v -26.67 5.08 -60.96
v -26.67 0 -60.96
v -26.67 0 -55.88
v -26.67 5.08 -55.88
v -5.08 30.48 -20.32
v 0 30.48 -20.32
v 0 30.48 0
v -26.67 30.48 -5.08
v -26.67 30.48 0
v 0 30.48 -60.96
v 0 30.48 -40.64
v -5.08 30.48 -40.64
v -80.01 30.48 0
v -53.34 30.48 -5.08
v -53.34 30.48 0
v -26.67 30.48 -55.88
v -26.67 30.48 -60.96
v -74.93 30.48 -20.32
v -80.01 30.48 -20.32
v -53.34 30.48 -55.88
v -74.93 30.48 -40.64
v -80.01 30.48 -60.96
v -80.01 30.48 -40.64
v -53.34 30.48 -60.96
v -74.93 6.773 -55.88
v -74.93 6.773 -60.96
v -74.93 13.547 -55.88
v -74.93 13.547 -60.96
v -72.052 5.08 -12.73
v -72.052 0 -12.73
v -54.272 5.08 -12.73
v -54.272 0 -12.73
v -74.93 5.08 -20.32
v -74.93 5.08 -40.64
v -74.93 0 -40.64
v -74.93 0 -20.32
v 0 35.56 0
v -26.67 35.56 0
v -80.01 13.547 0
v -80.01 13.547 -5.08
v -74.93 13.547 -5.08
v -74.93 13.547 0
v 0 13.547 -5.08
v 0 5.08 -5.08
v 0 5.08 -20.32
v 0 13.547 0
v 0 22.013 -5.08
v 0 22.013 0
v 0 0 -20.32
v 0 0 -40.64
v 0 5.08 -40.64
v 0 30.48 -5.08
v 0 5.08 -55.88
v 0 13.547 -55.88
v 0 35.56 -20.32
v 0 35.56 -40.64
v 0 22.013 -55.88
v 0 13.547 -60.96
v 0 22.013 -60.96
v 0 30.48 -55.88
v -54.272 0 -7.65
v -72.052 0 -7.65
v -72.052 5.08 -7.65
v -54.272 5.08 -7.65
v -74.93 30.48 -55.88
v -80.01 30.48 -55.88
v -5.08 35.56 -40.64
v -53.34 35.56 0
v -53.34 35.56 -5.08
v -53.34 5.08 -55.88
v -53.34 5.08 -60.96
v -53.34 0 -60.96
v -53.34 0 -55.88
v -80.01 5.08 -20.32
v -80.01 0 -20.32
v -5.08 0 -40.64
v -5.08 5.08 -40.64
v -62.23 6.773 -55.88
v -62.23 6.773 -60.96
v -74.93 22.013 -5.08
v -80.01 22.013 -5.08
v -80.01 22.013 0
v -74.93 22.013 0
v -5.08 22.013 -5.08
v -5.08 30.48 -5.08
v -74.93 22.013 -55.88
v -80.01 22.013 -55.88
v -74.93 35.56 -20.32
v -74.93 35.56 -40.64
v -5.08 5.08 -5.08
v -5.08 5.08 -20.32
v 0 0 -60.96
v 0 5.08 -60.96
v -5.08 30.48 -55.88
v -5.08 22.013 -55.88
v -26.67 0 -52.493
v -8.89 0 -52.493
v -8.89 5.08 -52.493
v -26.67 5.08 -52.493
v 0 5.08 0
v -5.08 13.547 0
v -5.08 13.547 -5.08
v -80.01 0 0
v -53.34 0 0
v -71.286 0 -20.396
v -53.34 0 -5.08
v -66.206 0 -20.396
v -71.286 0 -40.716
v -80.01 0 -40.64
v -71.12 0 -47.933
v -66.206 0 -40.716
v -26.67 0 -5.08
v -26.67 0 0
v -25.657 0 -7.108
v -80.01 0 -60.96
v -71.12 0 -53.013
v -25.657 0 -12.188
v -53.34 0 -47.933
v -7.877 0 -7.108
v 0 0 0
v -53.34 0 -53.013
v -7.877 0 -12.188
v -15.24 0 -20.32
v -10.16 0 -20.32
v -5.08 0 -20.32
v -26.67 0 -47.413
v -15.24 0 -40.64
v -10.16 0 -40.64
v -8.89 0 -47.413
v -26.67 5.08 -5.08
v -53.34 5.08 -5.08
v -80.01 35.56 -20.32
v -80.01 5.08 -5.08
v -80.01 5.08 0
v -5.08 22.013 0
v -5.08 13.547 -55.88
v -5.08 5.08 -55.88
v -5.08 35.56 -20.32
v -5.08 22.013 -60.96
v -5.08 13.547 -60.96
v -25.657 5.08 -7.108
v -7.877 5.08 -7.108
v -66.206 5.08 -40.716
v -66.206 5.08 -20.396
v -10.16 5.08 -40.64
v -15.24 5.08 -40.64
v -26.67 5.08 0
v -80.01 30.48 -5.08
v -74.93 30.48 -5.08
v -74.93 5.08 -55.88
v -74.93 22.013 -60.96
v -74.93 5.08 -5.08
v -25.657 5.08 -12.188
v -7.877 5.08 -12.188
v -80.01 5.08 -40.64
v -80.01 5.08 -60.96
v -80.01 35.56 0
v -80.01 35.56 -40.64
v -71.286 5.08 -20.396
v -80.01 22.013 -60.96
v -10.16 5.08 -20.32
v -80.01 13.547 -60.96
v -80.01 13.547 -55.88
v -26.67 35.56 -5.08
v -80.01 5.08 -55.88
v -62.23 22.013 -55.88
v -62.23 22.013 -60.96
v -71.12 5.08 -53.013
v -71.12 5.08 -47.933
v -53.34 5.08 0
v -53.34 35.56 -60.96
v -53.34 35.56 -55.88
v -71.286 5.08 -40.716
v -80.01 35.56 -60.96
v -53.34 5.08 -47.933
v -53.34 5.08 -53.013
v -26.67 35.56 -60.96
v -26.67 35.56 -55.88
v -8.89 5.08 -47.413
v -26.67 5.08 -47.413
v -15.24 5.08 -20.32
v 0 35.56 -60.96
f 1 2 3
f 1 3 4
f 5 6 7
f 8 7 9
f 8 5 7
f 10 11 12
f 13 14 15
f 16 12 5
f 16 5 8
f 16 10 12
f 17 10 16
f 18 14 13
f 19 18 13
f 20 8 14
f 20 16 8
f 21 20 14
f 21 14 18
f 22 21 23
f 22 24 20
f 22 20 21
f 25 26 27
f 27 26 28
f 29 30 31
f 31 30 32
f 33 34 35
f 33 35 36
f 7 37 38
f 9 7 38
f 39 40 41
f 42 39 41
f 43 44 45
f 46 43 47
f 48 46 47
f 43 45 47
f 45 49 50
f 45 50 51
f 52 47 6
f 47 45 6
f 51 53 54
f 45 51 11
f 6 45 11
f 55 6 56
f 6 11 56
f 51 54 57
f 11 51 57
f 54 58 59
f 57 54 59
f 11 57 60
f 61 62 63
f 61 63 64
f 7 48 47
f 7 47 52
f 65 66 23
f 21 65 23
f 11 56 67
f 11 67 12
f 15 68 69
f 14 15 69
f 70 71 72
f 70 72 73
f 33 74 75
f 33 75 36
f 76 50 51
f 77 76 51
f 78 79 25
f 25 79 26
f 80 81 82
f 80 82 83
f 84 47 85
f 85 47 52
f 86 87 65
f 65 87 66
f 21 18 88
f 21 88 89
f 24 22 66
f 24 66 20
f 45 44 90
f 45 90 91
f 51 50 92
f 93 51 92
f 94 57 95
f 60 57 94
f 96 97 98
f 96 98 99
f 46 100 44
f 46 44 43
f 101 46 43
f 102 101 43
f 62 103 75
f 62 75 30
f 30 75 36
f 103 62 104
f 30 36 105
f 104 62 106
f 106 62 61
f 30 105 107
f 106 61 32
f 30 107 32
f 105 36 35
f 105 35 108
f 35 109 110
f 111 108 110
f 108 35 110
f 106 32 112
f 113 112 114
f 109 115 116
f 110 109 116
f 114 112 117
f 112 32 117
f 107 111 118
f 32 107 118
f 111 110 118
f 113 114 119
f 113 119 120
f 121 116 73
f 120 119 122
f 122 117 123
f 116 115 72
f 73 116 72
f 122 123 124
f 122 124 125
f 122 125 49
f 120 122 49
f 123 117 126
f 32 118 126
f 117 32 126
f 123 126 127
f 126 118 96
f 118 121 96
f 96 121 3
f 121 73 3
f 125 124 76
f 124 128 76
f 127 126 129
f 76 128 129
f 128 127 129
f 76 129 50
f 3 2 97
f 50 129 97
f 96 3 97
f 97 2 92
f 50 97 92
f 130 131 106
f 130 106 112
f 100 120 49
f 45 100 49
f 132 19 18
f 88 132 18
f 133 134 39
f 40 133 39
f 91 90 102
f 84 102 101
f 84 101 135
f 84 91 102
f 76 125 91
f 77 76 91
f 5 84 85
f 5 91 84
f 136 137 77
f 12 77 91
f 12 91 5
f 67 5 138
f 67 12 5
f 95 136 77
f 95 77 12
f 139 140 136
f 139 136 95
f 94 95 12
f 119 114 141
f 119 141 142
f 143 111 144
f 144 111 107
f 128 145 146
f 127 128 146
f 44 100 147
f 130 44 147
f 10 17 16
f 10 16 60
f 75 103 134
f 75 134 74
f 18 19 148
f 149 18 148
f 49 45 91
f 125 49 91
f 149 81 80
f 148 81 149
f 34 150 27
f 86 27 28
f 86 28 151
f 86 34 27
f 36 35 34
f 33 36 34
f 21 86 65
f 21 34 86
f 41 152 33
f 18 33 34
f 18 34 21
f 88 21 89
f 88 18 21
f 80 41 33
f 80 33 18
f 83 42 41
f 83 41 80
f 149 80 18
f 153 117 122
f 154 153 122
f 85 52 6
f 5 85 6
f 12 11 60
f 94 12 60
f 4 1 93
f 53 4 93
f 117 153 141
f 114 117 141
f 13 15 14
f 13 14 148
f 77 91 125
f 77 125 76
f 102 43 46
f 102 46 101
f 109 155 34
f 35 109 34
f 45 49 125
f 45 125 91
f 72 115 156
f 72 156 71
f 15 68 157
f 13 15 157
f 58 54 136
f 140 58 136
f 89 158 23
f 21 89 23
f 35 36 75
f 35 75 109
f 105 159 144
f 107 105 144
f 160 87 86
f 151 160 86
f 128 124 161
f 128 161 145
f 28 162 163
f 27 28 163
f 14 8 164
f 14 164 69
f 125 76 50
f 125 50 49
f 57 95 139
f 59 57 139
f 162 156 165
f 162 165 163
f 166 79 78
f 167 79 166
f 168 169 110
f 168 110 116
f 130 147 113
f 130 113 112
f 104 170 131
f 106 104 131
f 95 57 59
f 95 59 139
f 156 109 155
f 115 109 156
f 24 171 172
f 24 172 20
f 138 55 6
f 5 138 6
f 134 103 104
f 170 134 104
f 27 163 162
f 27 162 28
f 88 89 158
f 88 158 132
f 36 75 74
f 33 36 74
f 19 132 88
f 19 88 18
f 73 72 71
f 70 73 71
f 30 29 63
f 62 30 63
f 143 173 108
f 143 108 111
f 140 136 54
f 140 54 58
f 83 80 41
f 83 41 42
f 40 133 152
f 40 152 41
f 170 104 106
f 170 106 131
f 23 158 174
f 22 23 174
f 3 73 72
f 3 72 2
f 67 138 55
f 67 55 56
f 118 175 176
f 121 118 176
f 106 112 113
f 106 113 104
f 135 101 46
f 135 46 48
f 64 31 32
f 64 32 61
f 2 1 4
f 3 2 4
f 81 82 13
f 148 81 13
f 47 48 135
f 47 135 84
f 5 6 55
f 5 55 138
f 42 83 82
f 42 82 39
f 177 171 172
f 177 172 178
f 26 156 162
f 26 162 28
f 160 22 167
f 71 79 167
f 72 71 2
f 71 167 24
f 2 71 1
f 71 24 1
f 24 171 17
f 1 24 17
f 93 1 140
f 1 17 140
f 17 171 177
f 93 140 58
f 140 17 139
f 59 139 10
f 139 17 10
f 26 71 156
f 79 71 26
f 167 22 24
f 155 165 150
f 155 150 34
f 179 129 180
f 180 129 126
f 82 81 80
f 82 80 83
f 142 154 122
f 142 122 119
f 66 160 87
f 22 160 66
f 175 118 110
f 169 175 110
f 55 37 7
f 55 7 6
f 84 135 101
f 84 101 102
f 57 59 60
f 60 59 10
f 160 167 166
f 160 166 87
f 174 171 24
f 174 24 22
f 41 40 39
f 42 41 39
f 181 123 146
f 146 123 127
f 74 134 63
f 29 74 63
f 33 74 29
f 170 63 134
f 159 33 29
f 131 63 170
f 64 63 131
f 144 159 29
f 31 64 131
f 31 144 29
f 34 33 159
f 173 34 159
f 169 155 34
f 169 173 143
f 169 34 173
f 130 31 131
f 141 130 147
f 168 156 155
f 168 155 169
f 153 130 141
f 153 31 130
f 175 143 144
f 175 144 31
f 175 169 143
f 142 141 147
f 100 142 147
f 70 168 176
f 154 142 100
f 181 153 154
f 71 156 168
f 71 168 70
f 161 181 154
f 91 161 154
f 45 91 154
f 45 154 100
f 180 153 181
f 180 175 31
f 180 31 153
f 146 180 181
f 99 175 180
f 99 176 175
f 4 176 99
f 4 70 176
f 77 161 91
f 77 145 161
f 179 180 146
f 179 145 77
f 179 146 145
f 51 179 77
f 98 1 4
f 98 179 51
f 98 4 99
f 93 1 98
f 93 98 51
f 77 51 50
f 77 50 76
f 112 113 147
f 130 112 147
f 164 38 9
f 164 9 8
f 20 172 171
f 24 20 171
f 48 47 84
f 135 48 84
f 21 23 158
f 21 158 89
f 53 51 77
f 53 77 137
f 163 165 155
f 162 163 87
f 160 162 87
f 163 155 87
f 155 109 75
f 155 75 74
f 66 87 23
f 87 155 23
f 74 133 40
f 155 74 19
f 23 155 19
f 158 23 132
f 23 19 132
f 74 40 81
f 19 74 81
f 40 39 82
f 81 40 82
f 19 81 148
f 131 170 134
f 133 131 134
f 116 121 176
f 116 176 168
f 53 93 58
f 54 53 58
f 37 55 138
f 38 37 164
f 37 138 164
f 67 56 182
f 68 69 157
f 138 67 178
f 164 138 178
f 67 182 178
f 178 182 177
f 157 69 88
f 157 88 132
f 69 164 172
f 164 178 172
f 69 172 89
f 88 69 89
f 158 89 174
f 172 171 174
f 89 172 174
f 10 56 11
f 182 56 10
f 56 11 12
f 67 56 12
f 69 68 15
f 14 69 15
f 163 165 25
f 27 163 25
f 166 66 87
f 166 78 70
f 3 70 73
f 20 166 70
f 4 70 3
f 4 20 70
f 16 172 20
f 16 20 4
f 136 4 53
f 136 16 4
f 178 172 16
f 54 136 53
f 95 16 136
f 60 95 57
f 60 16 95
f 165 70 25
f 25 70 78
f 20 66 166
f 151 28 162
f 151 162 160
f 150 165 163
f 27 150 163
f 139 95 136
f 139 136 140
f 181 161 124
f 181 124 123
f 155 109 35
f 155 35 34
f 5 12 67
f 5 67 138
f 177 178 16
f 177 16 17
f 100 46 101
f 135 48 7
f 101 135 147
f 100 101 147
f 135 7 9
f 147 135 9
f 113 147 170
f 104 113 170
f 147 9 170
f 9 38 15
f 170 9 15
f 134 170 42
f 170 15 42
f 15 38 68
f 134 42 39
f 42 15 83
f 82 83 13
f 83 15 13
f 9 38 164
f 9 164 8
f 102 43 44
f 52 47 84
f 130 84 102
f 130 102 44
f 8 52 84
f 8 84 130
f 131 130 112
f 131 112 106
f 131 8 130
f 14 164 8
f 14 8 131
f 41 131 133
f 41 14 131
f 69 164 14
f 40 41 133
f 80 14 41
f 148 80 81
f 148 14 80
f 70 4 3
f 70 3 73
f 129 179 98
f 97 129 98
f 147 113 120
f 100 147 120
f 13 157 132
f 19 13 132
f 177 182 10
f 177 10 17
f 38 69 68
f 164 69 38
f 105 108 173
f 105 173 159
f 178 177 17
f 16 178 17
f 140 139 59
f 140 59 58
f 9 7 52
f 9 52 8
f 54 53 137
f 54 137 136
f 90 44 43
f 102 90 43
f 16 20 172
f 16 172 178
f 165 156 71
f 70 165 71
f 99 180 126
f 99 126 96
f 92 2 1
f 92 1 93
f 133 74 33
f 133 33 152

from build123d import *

# Parameters (mm, degrees)
SKETCH1_W             = 80.01
SKETCH1_H             = 60.96
BOSS_EXTRUDE2_DEPTH   = 5.08
SKETCH2_W             = 20.32
SKETCH2_H             = 5.08
CUT_EXTRUDE1_DEPTH    = 5.08
SKETCH3_W             = 20.32
SKETCH3_H             = 5.08
CUT_EXTRUDE2_DEPTH    = 5.08
SKETCH4_W             = 26.67
SKETCH4_H             = 5.08
CUT_EXTRUDE3_DEPTH    = 5.08
SKETCH5_W             = 26.67
SKETCH5_H             = 5.08
CUT_EXTRUDE4_DEPTH    = 5.08
SKETCH6_W             = 80.01
SKETCH6_H             = 25.4
BOSS_EXTRUDE3_DEPTH   = 5.08
SKETCH7_W             = 26.67
SKETCH7_H             = 5.08
BOSS_EXTRUDE4_DEPTH   = 5.08
BODY_MOVE_COPY1_ANGLE = 90
CIRPATTERN1_COUNT     = 2
SKETCH8_W             = 5.08
SKETCH8_H             = 8.466666666
CUT_EXTRUDE5_DEPTH    = 5.08
SKETCH10_W            = 5.08
SKETCH10_H            = 8.466666666
CUT_EXTRUDE7_DEPTH    = 5.08
SKETCH17_W            = 12.7
SKETCH17_H            = 15.24
CUT_EXTRUDE8_DEPTH    = 5.08
SKETCH18_W            = 26.67
SKETCH18_H            = 5.08
BOSS_EXTRUDE11_DEPTH  = 5.08
CIRPATTERN4_COUNT     = 2
SKETCH19_W            = 25.4
SKETCH19_H            = 50.8
BOSS_EXTRUDE12_DEPTH  = 5.08
SKETCH20_W            = 8.466666666
SKETCH20_H            = 5.08
BOSS_EXTRUDE13_DEPTH  = 5.08
SKETCH21_W            = 8.466666666
SKETCH21_H            = 5.08
BOSS_EXTRUDE14_DEPTH  = 5.08
SKETCH22_W            = 20.32
SKETCH22_H            = 5.08
BOSS_EXTRUDE15_DEPTH  = 5.08
SKETCH23_W            = 20.32
SKETCH23_H            = 5.08
BOSS_EXTRUDE16_DEPTH  = 5.08
BODY_MOVE_COPY4_ANGLE = 90
CIRPATTERN5_ANGLE     = 180
SKETCH24_W            = 17.78
SKETCH24_H            = 5.08
CUT_EXTRUDE9_DEPTH    = 5.08
CIRPATTERN6_COUNT     = 2
SKETCH25_W            = 17.78
SKETCH25_H            = 5.08
CUT_EXTRUDE10_DEPTH   = 5.08
CIRPATTERN7_COUNT     = 2
SKETCH28_W            = 5.08
SKETCH28_H            = 20.32
CUT_EXTRUDE11_DEPTH   = 5.08
CIRPATTERN8_COUNT     = 2


with BuildPart() as part:
    # Sketch1 → Boss-Extrude2 (new body)
    with BuildSketch(Plane(origin=(0, 0, 0), x_dir=(1, 0, 0), z_dir=(0, 1, 0))):
        with Locations((-40.005, 30.48)):
            Rectangle(SKETCH1_W, SKETCH1_H)
    extrude(amount=BOSS_EXTRUDE2_DEPTH)

    # Sketch2 → Cut-Extrude1 (cut)
    with BuildSketch(Plane(origin=(0, 0, 0), x_dir=(0, 0, -1), z_dir=(1, 0, 0))):
        with Locations((30.48, 2.54)):
            Rectangle(SKETCH2_W, SKETCH2_H)
    extrude(amount=-CUT_EXTRUDE1_DEPTH, mode=Mode.SUBTRACT)

    # Sketch3 → Cut-Extrude2 (cut)
    with BuildSketch(Plane.ZY.offset(80.01)):
        with Locations((-30.48, 2.54)):
            Rectangle(SKETCH3_W, SKETCH3_H)
    extrude(amount=-CUT_EXTRUDE2_DEPTH, mode=Mode.SUBTRACT)

    # Sketch4 → Cut-Extrude3 (cut)
    with BuildSketch(Plane.XY):
        with Locations((-40.005, 2.54)):
            Rectangle(SKETCH4_W, SKETCH4_H)
    extrude(amount=-CUT_EXTRUDE3_DEPTH, mode=Mode.SUBTRACT)

    # Sketch5 → Cut-Extrude4 (cut)
    with BuildSketch(Plane(origin=(0, 0, -60.96), x_dir=(-1, 0, 0), z_dir=(0, 0, -1))):
        with Locations((40.005, 2.54)):
            Rectangle(SKETCH5_W, SKETCH5_H)
    extrude(amount=-CUT_EXTRUDE4_DEPTH, mode=Mode.SUBTRACT)


with BuildPart() as body_2:
    # Sketch6 → Boss-Extrude3 (new body)
    with BuildSketch(Plane(origin=(0, 5.08, 0), x_dir=(1, 0, 0), z_dir=(0, 1, 0))):
        with Locations((-21.199489538, 114.542707296)):
            Rectangle(SKETCH6_W, SKETCH6_H)
    extrude(amount=BOSS_EXTRUDE3_DEPTH)

    # Sketch7 → Boss-Extrude4 (add)
    with BuildSketch(Plane.XY.offset(-101.842707296)):
        with Locations((-21.199489538, 7.62)):
            Rectangle(SKETCH7_W, SKETCH7_H)
    extrude(amount=BOSS_EXTRUDE4_DEPTH)


with BuildPart() as body_2_1:
    # Body-Move/Copy1: read off the stored shape, not the designer's step
    # Body-Move/Copy1: moved
    add(body_2.part.moved(Location((-18.8055105, -66.04, 96.7627073))).rotate(Axis((0, 0, 0), (1, 0, 0)), BODY_MOVE_COPY1_ANGLE))


with BuildPart() as cirpattern1_1:
    # CirPattern1: pattern copy
    add(body_2_1.part.rotate(Axis((-40.005, 0, -30.48), (0, 1, 0)), 1 * 360 / CIRPATTERN1_COUNT))


with BuildPart() as cut_extrude5_tool:
    # Sketch8 → Cut-Extrude5 (new body)
    with BuildSketch(Plane(origin=(0, 0, 0), x_dir=(0, 0, -1), z_dir=(1, 0, 0))):
        with Locations((2.54, 17.78)):
            Rectangle(SKETCH8_W, SKETCH8_H)
        with Locations((58.42, 17.78)):
            Rectangle(SKETCH8_W, SKETCH8_H)
    extrude(amount=-CUT_EXTRUDE5_DEPTH)


with BuildPart() as body_2_2:
    add(body_2_1.part)

    # Cut-Extrude5: cut by cut_extrude5_tool
    add(cut_extrude5_tool.part, mode=Mode.SUBTRACT)


with BuildPart() as cirpattern1_1_1:
    add(cirpattern1_1.part)

    # Cut-Extrude5: cut by cut_extrude5_tool
    add(cut_extrude5_tool.part, mode=Mode.SUBTRACT)


with BuildPart() as cut_extrude7_tool:
    # Sketch10 → Cut-Extrude7 (new body)
    with BuildSketch(Plane.ZY.offset(80.01)):
        with Locations((-58.42, 17.78)):
            Rectangle(SKETCH10_W, SKETCH10_H)
        with Locations((-2.54, 17.78)):
            Rectangle(SKETCH10_W, SKETCH10_H)
    extrude(amount=-CUT_EXTRUDE7_DEPTH)


with BuildPart() as body_2_3:
    add(body_2_2.part)

    # Cut-Extrude7: cut by cut_extrude7_tool
    add(cut_extrude7_tool.part, mode=Mode.SUBTRACT)

    # Sketch17 → Cut-Extrude8 (cut)
    with BuildSketch(Plane(origin=(0, 0, -60.96), x_dir=(-1, 0, 0), z_dir=(0, 0, -1))):
        with Locations((68.58, 14.393333333)):
            Rectangle(SKETCH17_W, SKETCH17_H)
    extrude(amount=-CUT_EXTRUDE8_DEPTH, mode=Mode.SUBTRACT)



with BuildPart() as cirpattern1_1_2:
    add(cirpattern1_1_1.part)

    # Cut-Extrude7: cut by cut_extrude7_tool
    add(cut_extrude7_tool.part, mode=Mode.SUBTRACT)


with BuildPart() as body_2_4:
    add(body_2_3.part)

    add(cirpattern1_1_2.part)  # Boss-Extrude11 merges CirPattern1_1
    # Sketch18 → Boss-Extrude11 (add)
    with BuildSketch(Plane(origin=(0, 30.48, 0), x_dir=(1, 0, 0), z_dir=(0, 1, 0))):
        with Locations((-40.005, 2.54)):
            Rectangle(SKETCH18_W, SKETCH18_H)
        with Locations((-40.005, 58.42)):
            Rectangle(SKETCH18_W, SKETCH18_H)
    extrude(amount=BOSS_EXTRUDE11_DEPTH)


with BuildPart() as cirpattern4_1:
    # CirPattern4: pattern copy
    add(part.part.rotate(Axis((-40.005, 17.78, 0), (0, 0, 1)), 1 * 360 / CIRPATTERN4_COUNT))


with BuildPart() as body_4:
    # Sketch19 → Boss-Extrude12 (new body)
    with BuildSketch(Plane(origin=(0, 5.08, 0), x_dir=(1, 0, 0), z_dir=(0, 1, 0))):
        with Locations((73.923166649, 30.277821877)):
            Rectangle(SKETCH19_W, SKETCH19_H)
    extrude(amount=BOSS_EXTRUDE12_DEPTH)

    # Sketch20 → Boss-Extrude13 (add)
    with BuildSketch(Plane(origin=(0, 0, -55.677821877), x_dir=(-1, 0, 0), z_dir=(0, 0, -1))):
        with Locations((-73.923166649, 7.62)):
            Rectangle(SKETCH20_W, SKETCH20_H)
    extrude(amount=BOSS_EXTRUDE13_DEPTH)

    # Sketch21 → Boss-Extrude14 (add)
    with BuildSketch(Plane.XY.offset(-4.877821877)):
        with Locations((73.923166649, 7.62)):
            Rectangle(SKETCH21_W, SKETCH21_H)
    extrude(amount=BOSS_EXTRUDE14_DEPTH)

    # Sketch22 → Boss-Extrude15 (add)
    with BuildSketch(Plane(origin=(86.623166649, 0, 0), x_dir=(0, 0, -1), z_dir=(1, 0, 0))):
        with Locations((30.277821877, 7.62)):
            Rectangle(SKETCH22_W, SKETCH22_H)
    extrude(amount=BOSS_EXTRUDE15_DEPTH)

    # Sketch23 → Boss-Extrude16 (add)
    with BuildSketch(Plane.ZY.offset(-61.223166649)):
        with Locations((-30.277821877, 7.62)):
            Rectangle(SKETCH23_W, SKETCH23_H)
    extrude(amount=BOSS_EXTRUDE16_DEPTH)


with BuildPart() as body_4_1:
    # Body-Move/Copy4: read off the stored shape, not the designer's step
    # Body-Move/Copy4: moved
    add(body_4.part.moved(Location((-56.1431666, -5.08, -0.2021781))).rotate(Axis((0, 0, 0), (0, 0, 1)), BODY_MOVE_COPY4_ANGLE))


with BuildPart() as body_5:
    # CirPattern5: read off the stored shape, not the designer's step
    # CirPattern5: copy of body 4
    add(body_4_1.part.moved(Location((80.01, 0, 60.96))).rotate(Axis((0, 0, 0), (0, 1, 0)), CIRPATTERN5_ANGLE))


with BuildPart() as part_1:
    add(part.part)

    # Sketch24 → Cut-Extrude9 (cut)
    with BuildSketch(Plane(origin=(0, 0, 0), x_dir=(-1, 0, 0), z_dir=(0, -1, 0))):
        with Locations((17.78, 49.953333333)):
            Rectangle(SKETCH24_W, SKETCH24_H)
    cut_extrude9 = extrude(amount=-CUT_EXTRUDE9_DEPTH, mode=Mode.SUBTRACT)

    # CirPattern6: Cut-Extrude9 ×2 about axis
    cirpattern6_axis = Axis((-40.470793413, 0, -30.071876248), (0, 1, 0))
    for i in range(1, CIRPATTERN6_COUNT):
        add(cut_extrude9.rotate(cirpattern6_axis, i * 360 / CIRPATTERN6_COUNT), mode=Mode.SUBTRACT)

    # Sketch25 → Cut-Extrude10 (cut)
    with BuildSketch(Plane(origin=(0, 0, 0), x_dir=(-1, 0, 0), z_dir=(0, -1, 0))):
        with Locations((62.23, 50.473004536)):
            Rectangle(SKETCH25_W, SKETCH25_H)
    cut_extrude10 = extrude(amount=-CUT_EXTRUDE10_DEPTH, mode=Mode.SUBTRACT)

    # CirPattern7: Cut-Extrude10 ×2 about axis
    cirpattern7_axis = Axis((-39.498449663, 0, -30.06050844), (0, 1, 0))
    for i in range(1, CIRPATTERN7_COUNT):
        add(cut_extrude10.rotate(cirpattern7_axis, i * 360 / CIRPATTERN7_COUNT), mode=Mode.SUBTRACT)

    # Sketch28 → Cut-Extrude11 (cut)
    with BuildSketch(Plane(origin=(0, 0, 0), x_dir=(-1, 0, 0), z_dir=(0, -1, 0))):
        with Locations((12.7, 30.48)):
            Rectangle(SKETCH28_W, SKETCH28_H)
    cut_extrude11 = extrude(amount=-CUT_EXTRUDE11_DEPTH, mode=Mode.SUBTRACT)

    # CirPattern8: Cut-Extrude11 ×2 about axis
    cirpattern8_axis = Axis((-40.723067531, 0, -30.5179889), (0, 1, 0))
    for i in range(1, CIRPATTERN8_COUNT):
        add(cut_extrude11.rotate(cirpattern8_axis, i * 360 / CIRPATTERN8_COUNT), mode=Mode.SUBTRACT)


solid = Compound([body_2_4.part, cirpattern4_1.part, body_4_1.part, body_5.part, part_1.part])
